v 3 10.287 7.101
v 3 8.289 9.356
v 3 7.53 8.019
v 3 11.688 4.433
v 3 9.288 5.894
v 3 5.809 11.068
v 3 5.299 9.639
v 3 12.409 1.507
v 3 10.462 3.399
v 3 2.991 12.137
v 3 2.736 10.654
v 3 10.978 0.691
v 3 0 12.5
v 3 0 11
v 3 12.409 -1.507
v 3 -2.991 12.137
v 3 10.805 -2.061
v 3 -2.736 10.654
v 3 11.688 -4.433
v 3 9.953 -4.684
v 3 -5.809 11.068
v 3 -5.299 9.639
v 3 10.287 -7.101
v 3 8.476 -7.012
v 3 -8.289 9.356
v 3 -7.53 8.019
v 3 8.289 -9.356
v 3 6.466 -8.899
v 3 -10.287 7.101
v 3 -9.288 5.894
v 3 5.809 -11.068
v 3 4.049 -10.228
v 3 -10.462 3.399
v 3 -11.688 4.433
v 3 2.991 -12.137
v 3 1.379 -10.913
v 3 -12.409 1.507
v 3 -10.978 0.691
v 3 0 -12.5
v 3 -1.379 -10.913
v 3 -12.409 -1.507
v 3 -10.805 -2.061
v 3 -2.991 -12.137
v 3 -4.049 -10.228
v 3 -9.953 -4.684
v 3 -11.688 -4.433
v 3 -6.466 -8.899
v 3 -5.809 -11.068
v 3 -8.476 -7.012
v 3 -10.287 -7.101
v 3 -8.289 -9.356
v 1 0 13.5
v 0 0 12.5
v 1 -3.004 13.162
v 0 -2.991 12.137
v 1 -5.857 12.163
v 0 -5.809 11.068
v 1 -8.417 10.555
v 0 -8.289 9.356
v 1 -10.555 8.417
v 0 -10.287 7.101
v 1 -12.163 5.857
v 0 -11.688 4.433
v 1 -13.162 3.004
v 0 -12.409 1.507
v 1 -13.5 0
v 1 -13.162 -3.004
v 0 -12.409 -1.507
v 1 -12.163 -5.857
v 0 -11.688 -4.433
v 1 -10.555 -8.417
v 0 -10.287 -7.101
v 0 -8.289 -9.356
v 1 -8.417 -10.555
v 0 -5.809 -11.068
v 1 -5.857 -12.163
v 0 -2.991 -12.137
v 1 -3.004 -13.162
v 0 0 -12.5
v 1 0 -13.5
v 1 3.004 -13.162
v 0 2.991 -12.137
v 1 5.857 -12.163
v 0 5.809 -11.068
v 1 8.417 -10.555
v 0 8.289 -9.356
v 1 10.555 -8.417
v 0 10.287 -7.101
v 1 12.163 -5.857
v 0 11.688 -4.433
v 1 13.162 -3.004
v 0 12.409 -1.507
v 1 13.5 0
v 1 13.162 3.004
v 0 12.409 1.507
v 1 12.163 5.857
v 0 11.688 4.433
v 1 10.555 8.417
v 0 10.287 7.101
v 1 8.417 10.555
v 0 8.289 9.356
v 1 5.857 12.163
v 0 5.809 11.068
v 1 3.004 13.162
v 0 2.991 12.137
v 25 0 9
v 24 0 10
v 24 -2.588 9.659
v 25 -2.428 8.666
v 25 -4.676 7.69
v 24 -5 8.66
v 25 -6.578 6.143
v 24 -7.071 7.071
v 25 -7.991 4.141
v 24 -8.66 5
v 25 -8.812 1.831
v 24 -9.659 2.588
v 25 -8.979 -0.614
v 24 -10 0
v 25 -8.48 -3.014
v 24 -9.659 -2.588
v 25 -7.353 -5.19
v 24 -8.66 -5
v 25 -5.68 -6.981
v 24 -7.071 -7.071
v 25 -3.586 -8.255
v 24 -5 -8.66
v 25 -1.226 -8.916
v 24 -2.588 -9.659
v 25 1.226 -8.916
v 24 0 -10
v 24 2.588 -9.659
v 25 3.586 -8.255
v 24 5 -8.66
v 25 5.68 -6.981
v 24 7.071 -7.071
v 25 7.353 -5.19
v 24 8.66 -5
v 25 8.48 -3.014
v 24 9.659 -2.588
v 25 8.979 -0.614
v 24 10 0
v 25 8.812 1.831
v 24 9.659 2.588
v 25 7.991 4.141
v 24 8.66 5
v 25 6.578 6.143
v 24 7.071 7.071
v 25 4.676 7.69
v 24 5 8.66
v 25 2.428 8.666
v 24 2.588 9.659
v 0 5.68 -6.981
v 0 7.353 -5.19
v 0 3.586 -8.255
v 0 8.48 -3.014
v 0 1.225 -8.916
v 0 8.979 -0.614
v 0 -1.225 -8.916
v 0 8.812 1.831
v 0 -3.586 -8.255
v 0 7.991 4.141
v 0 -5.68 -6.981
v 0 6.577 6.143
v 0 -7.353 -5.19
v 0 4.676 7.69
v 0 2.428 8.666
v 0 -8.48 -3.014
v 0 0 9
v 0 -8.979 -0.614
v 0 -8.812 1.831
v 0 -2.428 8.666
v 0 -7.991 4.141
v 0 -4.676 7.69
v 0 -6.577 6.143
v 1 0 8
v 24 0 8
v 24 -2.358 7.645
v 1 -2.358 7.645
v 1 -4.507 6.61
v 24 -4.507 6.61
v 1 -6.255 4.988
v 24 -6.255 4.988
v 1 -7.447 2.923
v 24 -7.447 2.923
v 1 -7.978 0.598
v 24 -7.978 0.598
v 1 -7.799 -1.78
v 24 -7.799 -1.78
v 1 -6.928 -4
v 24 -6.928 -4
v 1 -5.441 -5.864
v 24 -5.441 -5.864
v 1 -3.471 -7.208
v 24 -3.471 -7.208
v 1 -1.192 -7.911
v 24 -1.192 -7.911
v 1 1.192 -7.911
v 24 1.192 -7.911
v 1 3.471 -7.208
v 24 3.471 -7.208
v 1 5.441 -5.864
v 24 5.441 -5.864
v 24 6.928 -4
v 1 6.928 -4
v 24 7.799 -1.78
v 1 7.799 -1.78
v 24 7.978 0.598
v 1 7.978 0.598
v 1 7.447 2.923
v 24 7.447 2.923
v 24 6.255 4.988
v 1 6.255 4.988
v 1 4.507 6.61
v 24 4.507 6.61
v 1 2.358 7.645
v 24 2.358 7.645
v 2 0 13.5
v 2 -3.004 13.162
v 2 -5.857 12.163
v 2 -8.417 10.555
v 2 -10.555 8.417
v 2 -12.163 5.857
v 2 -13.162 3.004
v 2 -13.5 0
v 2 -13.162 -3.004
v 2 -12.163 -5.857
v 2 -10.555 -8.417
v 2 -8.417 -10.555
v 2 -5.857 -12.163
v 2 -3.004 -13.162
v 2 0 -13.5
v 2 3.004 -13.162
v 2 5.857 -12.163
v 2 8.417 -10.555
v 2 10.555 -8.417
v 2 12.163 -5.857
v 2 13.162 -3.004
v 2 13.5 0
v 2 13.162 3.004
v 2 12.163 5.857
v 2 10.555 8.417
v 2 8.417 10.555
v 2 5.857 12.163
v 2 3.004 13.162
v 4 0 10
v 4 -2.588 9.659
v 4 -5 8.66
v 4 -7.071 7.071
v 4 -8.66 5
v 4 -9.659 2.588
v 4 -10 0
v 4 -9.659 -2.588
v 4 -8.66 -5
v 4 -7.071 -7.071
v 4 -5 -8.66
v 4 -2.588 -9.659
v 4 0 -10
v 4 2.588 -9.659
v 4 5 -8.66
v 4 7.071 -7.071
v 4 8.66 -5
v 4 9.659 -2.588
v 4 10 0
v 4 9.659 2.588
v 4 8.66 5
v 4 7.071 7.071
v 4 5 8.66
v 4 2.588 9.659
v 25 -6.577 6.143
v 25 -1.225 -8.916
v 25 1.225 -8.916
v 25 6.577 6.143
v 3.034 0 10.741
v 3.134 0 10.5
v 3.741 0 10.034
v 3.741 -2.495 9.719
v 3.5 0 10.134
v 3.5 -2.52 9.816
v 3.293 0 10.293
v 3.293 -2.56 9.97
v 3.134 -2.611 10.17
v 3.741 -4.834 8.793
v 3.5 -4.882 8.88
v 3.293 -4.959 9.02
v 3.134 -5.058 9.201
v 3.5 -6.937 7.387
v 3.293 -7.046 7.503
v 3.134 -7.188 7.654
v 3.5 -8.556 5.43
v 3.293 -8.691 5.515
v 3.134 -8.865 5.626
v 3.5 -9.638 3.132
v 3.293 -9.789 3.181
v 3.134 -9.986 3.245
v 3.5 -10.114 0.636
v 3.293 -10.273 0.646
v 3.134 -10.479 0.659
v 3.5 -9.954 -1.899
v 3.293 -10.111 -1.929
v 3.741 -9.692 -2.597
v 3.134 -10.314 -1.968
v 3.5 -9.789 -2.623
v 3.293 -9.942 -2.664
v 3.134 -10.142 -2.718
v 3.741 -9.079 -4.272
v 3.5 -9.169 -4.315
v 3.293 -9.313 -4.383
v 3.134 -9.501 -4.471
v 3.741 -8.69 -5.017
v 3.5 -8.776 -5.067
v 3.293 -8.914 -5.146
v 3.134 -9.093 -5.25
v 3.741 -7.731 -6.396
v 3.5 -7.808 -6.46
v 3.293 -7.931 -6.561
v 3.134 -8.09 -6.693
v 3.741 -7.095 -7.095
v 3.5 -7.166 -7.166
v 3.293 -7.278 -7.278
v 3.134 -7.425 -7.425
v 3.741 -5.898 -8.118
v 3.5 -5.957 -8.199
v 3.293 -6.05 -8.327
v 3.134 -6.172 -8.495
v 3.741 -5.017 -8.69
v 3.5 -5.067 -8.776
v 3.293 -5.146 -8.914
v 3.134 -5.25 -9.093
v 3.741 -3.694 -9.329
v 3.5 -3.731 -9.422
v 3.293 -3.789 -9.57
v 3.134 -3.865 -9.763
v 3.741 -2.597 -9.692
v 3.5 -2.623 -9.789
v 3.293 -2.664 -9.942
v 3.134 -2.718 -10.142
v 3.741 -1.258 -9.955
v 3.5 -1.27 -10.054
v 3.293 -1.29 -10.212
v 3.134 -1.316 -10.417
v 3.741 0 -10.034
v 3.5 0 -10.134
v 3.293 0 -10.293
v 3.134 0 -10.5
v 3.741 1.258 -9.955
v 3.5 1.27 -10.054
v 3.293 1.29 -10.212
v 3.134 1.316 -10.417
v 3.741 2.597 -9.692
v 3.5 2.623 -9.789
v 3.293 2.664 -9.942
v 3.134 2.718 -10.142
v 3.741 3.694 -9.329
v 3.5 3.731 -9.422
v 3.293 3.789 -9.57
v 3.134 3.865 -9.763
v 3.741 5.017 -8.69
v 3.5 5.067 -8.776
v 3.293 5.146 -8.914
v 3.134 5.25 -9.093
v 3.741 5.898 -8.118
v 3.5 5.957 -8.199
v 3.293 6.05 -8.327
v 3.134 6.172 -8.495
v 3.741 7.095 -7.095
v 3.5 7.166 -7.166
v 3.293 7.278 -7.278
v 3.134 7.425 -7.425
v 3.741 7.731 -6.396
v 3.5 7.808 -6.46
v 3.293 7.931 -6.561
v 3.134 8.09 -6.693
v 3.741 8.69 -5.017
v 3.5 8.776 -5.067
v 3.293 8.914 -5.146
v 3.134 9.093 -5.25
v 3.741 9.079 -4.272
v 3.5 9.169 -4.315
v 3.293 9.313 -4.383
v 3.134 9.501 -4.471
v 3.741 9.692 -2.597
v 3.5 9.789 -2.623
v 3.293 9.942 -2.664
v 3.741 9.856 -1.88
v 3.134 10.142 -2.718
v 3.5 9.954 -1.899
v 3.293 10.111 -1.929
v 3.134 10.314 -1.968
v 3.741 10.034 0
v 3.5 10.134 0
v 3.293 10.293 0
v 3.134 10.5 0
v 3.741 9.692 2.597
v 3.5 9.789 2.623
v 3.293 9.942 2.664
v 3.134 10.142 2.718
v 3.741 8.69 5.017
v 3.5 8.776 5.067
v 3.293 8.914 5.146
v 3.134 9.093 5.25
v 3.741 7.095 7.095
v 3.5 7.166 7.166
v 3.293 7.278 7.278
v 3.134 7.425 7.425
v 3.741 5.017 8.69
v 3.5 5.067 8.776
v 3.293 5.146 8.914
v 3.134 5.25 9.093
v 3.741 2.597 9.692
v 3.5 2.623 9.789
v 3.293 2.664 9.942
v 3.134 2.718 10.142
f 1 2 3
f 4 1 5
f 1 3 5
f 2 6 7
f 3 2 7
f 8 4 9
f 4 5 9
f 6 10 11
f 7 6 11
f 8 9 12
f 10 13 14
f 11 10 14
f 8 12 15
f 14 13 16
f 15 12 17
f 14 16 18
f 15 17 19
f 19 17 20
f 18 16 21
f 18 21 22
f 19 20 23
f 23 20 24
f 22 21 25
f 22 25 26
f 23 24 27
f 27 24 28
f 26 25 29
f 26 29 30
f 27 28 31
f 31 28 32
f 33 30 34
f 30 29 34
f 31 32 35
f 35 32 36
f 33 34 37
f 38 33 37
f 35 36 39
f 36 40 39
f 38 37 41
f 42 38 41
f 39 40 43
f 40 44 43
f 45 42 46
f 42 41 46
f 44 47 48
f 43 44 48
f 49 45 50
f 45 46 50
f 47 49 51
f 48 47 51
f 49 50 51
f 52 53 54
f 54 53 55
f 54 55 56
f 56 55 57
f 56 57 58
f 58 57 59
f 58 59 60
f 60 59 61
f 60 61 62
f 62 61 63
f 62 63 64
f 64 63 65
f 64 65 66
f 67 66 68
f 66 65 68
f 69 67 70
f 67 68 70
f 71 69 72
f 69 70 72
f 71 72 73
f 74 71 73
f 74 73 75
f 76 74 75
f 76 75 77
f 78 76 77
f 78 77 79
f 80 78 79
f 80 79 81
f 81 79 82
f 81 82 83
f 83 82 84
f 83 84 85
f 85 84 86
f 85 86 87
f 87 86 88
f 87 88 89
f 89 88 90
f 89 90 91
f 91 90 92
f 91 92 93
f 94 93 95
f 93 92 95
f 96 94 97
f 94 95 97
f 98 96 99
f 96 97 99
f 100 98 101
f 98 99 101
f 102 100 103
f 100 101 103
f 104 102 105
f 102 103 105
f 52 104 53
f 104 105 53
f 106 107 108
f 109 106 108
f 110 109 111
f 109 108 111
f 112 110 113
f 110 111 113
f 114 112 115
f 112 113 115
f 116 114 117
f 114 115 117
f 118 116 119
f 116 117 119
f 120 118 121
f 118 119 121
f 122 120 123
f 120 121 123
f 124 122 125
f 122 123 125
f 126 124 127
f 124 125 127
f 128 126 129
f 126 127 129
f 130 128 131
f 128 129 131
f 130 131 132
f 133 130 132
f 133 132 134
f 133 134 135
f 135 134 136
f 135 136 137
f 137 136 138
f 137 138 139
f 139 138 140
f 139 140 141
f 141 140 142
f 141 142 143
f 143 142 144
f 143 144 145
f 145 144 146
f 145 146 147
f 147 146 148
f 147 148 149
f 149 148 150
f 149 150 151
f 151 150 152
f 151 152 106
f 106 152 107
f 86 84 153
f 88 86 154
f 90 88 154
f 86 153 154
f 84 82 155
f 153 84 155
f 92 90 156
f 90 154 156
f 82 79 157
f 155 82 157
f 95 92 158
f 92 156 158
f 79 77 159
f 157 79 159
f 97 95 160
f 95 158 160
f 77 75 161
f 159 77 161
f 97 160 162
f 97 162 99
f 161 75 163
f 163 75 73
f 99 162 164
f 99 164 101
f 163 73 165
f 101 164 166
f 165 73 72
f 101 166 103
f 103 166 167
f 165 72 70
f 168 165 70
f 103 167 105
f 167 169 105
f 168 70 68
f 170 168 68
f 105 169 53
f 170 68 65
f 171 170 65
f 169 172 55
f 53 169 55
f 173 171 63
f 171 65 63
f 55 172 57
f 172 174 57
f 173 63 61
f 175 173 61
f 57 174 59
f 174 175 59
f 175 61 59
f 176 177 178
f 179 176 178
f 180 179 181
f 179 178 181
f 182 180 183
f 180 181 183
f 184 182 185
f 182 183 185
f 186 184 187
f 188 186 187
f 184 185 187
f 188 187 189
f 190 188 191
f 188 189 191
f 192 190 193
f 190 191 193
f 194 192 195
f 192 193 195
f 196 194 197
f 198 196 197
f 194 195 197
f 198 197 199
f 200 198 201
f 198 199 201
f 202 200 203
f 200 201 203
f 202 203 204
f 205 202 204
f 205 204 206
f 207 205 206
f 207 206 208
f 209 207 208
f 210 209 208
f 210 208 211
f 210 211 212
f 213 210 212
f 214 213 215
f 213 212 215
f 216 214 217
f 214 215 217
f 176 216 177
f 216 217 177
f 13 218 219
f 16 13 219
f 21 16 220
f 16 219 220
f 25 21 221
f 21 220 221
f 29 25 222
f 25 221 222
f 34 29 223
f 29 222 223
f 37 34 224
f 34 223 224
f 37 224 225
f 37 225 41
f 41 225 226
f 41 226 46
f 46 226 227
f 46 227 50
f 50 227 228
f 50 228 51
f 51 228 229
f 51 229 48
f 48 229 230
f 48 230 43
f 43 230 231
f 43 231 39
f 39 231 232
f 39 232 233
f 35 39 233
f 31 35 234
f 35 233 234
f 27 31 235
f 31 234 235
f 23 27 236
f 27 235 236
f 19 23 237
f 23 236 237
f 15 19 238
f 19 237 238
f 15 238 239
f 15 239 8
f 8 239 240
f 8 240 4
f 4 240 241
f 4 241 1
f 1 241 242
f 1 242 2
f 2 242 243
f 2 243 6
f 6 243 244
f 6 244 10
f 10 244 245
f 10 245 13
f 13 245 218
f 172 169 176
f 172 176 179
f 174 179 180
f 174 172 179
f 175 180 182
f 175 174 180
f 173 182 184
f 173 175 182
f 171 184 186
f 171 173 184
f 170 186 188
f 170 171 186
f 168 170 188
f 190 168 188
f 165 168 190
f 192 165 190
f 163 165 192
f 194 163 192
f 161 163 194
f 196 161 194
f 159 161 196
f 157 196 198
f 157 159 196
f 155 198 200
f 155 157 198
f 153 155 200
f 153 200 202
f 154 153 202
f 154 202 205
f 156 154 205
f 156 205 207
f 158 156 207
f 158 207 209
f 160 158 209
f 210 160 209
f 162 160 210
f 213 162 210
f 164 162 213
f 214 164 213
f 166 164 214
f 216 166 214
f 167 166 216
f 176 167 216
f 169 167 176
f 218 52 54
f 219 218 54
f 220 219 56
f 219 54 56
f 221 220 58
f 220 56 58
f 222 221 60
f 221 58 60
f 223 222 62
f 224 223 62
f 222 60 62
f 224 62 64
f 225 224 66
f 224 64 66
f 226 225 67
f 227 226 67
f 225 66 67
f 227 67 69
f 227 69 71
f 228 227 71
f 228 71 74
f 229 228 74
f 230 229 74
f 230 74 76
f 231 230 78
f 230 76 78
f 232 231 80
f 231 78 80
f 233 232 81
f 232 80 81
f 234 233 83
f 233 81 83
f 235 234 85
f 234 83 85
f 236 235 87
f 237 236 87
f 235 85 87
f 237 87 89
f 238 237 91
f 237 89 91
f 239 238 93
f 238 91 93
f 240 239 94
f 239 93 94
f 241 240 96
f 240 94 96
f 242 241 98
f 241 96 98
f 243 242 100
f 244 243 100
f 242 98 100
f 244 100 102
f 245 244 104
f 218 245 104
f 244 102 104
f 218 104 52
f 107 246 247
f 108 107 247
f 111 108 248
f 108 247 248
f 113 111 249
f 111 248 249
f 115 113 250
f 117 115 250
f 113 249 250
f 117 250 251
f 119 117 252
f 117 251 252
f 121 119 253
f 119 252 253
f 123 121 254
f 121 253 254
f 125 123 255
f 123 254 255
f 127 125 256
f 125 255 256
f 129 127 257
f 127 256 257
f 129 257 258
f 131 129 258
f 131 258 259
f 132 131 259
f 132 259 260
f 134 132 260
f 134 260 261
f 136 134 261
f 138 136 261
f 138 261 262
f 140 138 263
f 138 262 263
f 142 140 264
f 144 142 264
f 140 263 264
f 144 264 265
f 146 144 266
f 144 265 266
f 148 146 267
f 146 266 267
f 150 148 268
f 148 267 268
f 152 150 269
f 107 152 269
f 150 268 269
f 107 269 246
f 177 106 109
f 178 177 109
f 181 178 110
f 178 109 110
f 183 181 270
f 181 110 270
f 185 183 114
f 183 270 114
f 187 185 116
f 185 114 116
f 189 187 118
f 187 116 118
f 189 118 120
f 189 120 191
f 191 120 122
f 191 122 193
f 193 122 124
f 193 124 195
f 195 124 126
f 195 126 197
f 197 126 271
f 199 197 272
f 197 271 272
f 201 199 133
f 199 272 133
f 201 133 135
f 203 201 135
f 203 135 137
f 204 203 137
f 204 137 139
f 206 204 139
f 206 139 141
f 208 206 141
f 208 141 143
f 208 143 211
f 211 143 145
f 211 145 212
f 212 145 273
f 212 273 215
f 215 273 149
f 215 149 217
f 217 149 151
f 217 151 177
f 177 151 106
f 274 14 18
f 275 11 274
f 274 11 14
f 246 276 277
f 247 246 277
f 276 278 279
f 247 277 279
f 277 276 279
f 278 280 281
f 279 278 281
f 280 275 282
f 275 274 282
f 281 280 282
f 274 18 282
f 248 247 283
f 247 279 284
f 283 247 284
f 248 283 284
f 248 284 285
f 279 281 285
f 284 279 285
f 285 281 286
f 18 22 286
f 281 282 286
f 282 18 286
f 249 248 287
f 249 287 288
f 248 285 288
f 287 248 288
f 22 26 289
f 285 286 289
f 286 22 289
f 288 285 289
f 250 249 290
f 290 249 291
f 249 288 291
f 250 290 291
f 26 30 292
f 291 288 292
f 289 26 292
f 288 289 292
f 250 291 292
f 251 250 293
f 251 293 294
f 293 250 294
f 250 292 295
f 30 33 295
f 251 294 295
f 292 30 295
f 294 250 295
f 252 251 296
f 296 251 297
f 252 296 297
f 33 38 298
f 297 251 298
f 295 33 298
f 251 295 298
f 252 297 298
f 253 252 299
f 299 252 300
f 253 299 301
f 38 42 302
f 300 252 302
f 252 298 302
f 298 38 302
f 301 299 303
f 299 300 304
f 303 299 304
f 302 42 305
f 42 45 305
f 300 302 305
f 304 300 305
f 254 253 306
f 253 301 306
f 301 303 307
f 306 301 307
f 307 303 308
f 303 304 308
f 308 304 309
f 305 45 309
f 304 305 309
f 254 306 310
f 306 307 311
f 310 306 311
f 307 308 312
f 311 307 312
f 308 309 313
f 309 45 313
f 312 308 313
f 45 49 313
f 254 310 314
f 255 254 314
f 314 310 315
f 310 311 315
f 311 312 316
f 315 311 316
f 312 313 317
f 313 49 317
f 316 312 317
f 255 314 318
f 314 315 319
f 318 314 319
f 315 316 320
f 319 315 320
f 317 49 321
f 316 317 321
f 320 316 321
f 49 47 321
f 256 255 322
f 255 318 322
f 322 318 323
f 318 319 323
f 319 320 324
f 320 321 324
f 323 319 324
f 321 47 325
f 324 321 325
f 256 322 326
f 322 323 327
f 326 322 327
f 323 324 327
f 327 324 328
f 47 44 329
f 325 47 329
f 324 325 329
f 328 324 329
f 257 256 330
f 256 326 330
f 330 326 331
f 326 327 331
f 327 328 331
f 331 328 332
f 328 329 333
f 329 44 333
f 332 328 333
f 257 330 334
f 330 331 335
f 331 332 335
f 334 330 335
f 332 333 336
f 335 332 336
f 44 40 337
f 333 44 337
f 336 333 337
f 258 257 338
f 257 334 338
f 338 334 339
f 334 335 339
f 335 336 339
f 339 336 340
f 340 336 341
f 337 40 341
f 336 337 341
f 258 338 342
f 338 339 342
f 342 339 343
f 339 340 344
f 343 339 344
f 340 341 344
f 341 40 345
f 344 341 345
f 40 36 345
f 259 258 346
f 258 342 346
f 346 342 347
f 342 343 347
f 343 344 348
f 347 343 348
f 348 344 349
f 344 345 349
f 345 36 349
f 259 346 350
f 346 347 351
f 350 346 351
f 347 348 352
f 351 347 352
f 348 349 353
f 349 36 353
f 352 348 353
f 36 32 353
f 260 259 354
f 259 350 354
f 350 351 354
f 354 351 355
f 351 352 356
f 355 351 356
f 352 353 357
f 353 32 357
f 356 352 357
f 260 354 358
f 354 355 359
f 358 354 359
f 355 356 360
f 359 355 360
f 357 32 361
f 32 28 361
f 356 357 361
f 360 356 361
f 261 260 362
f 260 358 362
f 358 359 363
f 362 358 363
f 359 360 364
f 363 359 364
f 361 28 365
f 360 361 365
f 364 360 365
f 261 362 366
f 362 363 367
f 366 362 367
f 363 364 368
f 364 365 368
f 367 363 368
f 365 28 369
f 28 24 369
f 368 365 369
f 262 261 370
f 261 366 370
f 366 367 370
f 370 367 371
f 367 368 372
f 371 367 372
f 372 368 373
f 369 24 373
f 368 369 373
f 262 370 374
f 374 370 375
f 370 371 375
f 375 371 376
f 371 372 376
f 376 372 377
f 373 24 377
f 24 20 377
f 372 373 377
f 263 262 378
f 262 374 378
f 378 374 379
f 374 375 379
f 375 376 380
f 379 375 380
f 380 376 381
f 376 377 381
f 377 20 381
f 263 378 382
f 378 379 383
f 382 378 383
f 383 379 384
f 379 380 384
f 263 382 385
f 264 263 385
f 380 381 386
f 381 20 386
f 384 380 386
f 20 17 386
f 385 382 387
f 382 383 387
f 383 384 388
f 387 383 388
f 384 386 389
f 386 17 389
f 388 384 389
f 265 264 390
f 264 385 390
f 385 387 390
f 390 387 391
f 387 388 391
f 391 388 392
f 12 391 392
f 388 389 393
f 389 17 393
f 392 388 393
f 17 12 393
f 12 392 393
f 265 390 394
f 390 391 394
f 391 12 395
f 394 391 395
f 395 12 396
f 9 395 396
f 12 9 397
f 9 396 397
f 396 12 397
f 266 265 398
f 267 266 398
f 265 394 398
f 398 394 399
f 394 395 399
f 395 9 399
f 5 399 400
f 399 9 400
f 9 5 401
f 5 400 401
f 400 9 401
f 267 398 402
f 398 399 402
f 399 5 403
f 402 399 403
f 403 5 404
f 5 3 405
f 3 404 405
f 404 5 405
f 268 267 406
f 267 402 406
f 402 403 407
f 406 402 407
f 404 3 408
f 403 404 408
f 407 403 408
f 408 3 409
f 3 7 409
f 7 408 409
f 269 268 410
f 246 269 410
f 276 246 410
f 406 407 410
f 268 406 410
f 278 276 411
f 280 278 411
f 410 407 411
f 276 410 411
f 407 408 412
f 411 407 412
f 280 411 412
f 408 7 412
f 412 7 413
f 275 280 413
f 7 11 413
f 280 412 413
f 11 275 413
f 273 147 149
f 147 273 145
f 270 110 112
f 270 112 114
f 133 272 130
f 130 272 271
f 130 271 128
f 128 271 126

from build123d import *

# Parameters (mm, degrees)
CHAMFER1_SIZE = 1
FILLET1_R     = 1


with BuildPart() as part:
    # Sketch1 → Revolve1 (revolve)
    with BuildSketch(Plane.XY, mode=Mode.PRIVATE) as revolve1_sk:
        Polygon((0, 8), (25, 8), (25, 10), (3, 10), (3, 13.5), (0, 13.5), align=None)
    revolve(revolve1_sk.sketch.rotate(Axis((0, 0, 0), (1, 0, 0)), 90), axis=Axis((0, 0, 0), (1, 0, 0)))

    # Chamfer1
    chamfer1_edges = [part.edges().sort_by_distance(p)[0] for p in [
        (0, 0, -13.5),
        (3, 0, -13.5),
        (25, 0, -10),
        (25, 0, -8),
        (0, 0, -8),
    ]]
    chamfer(chamfer1_edges, length=CHAMFER1_SIZE - 0.0001)  # a hair under: the kernel refuses the full size

    # Fillet1
    fillet1_edges = [part.edges().sort_by_distance(p)[0] for p in [
        (3, 0, -10),
    ]]
    fillet(fillet1_edges, radius=FILLET1_R)


solid = part.part
